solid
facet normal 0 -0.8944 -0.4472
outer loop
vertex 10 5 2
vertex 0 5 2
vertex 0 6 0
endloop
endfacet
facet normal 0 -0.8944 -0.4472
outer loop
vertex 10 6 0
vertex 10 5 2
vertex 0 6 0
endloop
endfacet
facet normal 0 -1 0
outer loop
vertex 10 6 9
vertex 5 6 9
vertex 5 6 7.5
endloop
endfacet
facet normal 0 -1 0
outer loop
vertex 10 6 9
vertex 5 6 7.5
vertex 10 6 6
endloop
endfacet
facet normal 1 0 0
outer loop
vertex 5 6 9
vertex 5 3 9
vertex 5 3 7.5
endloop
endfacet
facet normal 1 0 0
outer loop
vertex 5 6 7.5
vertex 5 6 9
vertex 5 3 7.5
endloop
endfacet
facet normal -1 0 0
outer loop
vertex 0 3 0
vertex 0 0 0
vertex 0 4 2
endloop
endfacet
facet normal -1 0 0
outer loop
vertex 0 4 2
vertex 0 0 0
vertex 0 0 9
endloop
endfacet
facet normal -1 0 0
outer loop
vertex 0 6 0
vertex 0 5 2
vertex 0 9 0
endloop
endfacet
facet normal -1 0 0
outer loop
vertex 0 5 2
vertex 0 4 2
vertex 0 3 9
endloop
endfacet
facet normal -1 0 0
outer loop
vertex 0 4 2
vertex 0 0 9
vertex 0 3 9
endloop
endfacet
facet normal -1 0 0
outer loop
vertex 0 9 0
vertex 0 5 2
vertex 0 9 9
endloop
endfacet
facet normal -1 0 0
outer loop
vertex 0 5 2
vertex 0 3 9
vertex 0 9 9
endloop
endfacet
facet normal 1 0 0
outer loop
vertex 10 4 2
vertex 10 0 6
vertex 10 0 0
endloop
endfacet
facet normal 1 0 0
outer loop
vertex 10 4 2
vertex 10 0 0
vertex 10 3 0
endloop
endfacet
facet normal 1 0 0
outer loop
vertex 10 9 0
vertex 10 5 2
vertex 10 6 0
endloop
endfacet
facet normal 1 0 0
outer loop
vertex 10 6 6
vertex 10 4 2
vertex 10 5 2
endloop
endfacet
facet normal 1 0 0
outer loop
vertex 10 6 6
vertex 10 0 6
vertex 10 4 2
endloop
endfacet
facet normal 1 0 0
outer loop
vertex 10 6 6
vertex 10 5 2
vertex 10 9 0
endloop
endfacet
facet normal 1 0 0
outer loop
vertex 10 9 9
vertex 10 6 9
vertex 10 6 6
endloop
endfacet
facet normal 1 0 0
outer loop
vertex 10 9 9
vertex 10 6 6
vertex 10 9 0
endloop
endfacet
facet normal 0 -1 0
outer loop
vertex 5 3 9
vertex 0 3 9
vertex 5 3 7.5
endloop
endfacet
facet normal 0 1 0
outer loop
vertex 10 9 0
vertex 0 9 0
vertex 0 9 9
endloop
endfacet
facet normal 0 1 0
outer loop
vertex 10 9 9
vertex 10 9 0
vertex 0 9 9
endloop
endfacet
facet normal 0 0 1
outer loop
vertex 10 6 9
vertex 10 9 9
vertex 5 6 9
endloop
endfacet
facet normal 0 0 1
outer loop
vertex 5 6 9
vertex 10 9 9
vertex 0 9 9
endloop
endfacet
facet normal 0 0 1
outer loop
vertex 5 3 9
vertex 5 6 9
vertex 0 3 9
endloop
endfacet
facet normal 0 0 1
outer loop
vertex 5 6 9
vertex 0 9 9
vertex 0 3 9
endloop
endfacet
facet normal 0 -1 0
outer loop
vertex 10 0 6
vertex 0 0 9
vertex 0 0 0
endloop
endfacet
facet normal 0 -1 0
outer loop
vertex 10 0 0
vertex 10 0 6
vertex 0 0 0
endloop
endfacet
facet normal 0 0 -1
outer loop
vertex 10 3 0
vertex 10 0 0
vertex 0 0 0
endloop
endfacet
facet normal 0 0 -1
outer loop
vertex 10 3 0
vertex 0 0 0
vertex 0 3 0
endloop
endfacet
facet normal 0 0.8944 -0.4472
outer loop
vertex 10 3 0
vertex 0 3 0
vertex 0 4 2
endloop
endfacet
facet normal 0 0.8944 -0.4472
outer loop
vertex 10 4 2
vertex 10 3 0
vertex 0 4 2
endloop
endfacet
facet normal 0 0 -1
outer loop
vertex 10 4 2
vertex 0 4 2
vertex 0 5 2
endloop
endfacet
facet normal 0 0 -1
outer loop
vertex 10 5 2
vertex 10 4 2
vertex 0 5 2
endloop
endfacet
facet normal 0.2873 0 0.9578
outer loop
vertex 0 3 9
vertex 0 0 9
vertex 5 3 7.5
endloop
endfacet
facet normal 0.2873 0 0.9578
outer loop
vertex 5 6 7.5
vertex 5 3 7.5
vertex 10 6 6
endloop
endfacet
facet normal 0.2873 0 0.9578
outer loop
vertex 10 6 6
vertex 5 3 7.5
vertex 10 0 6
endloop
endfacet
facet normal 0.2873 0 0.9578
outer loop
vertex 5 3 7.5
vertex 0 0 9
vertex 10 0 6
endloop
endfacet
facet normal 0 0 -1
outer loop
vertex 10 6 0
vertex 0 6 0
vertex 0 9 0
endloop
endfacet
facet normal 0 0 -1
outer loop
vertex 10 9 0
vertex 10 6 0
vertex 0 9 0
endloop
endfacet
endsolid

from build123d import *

# Parameters (mm, degrees)
F1_DEPTH = 10
F3_DEPTH = 3
F4_DEPTH = 6


with BuildPart() as f1:
    # F0 (on Right) → F1 (new body)
    with BuildSketch(Plane.YZ):
        Polygon((0, 9), (0, 0), (3, 0), (4, 2), (4.5, 2), (5, 2), (6, 0), (9, 0), (9, 9), align=None)
    extrude(amount=F1_DEPTH)

    # F2 (on face) → F3 (cut)
    with BuildSketch(Plane.XZ):
        Polygon((5, 9), (0, 9), (5, 7.5), align=None)
        Polygon((5, 9), (5, 7.5), (10, 6), (10, 9), align=None)
    extrude(amount=-F3_DEPTH, mode=Mode.SUBTRACT)

    # F2 (on face) → F4 (cut)
    with BuildSketch(Plane.XZ):
        Polygon((5, 9), (5, 7.5), (10, 6), (10, 9), align=None)
    extrude(amount=-F4_DEPTH, mode=Mode.SUBTRACT)


solid = f1.part
